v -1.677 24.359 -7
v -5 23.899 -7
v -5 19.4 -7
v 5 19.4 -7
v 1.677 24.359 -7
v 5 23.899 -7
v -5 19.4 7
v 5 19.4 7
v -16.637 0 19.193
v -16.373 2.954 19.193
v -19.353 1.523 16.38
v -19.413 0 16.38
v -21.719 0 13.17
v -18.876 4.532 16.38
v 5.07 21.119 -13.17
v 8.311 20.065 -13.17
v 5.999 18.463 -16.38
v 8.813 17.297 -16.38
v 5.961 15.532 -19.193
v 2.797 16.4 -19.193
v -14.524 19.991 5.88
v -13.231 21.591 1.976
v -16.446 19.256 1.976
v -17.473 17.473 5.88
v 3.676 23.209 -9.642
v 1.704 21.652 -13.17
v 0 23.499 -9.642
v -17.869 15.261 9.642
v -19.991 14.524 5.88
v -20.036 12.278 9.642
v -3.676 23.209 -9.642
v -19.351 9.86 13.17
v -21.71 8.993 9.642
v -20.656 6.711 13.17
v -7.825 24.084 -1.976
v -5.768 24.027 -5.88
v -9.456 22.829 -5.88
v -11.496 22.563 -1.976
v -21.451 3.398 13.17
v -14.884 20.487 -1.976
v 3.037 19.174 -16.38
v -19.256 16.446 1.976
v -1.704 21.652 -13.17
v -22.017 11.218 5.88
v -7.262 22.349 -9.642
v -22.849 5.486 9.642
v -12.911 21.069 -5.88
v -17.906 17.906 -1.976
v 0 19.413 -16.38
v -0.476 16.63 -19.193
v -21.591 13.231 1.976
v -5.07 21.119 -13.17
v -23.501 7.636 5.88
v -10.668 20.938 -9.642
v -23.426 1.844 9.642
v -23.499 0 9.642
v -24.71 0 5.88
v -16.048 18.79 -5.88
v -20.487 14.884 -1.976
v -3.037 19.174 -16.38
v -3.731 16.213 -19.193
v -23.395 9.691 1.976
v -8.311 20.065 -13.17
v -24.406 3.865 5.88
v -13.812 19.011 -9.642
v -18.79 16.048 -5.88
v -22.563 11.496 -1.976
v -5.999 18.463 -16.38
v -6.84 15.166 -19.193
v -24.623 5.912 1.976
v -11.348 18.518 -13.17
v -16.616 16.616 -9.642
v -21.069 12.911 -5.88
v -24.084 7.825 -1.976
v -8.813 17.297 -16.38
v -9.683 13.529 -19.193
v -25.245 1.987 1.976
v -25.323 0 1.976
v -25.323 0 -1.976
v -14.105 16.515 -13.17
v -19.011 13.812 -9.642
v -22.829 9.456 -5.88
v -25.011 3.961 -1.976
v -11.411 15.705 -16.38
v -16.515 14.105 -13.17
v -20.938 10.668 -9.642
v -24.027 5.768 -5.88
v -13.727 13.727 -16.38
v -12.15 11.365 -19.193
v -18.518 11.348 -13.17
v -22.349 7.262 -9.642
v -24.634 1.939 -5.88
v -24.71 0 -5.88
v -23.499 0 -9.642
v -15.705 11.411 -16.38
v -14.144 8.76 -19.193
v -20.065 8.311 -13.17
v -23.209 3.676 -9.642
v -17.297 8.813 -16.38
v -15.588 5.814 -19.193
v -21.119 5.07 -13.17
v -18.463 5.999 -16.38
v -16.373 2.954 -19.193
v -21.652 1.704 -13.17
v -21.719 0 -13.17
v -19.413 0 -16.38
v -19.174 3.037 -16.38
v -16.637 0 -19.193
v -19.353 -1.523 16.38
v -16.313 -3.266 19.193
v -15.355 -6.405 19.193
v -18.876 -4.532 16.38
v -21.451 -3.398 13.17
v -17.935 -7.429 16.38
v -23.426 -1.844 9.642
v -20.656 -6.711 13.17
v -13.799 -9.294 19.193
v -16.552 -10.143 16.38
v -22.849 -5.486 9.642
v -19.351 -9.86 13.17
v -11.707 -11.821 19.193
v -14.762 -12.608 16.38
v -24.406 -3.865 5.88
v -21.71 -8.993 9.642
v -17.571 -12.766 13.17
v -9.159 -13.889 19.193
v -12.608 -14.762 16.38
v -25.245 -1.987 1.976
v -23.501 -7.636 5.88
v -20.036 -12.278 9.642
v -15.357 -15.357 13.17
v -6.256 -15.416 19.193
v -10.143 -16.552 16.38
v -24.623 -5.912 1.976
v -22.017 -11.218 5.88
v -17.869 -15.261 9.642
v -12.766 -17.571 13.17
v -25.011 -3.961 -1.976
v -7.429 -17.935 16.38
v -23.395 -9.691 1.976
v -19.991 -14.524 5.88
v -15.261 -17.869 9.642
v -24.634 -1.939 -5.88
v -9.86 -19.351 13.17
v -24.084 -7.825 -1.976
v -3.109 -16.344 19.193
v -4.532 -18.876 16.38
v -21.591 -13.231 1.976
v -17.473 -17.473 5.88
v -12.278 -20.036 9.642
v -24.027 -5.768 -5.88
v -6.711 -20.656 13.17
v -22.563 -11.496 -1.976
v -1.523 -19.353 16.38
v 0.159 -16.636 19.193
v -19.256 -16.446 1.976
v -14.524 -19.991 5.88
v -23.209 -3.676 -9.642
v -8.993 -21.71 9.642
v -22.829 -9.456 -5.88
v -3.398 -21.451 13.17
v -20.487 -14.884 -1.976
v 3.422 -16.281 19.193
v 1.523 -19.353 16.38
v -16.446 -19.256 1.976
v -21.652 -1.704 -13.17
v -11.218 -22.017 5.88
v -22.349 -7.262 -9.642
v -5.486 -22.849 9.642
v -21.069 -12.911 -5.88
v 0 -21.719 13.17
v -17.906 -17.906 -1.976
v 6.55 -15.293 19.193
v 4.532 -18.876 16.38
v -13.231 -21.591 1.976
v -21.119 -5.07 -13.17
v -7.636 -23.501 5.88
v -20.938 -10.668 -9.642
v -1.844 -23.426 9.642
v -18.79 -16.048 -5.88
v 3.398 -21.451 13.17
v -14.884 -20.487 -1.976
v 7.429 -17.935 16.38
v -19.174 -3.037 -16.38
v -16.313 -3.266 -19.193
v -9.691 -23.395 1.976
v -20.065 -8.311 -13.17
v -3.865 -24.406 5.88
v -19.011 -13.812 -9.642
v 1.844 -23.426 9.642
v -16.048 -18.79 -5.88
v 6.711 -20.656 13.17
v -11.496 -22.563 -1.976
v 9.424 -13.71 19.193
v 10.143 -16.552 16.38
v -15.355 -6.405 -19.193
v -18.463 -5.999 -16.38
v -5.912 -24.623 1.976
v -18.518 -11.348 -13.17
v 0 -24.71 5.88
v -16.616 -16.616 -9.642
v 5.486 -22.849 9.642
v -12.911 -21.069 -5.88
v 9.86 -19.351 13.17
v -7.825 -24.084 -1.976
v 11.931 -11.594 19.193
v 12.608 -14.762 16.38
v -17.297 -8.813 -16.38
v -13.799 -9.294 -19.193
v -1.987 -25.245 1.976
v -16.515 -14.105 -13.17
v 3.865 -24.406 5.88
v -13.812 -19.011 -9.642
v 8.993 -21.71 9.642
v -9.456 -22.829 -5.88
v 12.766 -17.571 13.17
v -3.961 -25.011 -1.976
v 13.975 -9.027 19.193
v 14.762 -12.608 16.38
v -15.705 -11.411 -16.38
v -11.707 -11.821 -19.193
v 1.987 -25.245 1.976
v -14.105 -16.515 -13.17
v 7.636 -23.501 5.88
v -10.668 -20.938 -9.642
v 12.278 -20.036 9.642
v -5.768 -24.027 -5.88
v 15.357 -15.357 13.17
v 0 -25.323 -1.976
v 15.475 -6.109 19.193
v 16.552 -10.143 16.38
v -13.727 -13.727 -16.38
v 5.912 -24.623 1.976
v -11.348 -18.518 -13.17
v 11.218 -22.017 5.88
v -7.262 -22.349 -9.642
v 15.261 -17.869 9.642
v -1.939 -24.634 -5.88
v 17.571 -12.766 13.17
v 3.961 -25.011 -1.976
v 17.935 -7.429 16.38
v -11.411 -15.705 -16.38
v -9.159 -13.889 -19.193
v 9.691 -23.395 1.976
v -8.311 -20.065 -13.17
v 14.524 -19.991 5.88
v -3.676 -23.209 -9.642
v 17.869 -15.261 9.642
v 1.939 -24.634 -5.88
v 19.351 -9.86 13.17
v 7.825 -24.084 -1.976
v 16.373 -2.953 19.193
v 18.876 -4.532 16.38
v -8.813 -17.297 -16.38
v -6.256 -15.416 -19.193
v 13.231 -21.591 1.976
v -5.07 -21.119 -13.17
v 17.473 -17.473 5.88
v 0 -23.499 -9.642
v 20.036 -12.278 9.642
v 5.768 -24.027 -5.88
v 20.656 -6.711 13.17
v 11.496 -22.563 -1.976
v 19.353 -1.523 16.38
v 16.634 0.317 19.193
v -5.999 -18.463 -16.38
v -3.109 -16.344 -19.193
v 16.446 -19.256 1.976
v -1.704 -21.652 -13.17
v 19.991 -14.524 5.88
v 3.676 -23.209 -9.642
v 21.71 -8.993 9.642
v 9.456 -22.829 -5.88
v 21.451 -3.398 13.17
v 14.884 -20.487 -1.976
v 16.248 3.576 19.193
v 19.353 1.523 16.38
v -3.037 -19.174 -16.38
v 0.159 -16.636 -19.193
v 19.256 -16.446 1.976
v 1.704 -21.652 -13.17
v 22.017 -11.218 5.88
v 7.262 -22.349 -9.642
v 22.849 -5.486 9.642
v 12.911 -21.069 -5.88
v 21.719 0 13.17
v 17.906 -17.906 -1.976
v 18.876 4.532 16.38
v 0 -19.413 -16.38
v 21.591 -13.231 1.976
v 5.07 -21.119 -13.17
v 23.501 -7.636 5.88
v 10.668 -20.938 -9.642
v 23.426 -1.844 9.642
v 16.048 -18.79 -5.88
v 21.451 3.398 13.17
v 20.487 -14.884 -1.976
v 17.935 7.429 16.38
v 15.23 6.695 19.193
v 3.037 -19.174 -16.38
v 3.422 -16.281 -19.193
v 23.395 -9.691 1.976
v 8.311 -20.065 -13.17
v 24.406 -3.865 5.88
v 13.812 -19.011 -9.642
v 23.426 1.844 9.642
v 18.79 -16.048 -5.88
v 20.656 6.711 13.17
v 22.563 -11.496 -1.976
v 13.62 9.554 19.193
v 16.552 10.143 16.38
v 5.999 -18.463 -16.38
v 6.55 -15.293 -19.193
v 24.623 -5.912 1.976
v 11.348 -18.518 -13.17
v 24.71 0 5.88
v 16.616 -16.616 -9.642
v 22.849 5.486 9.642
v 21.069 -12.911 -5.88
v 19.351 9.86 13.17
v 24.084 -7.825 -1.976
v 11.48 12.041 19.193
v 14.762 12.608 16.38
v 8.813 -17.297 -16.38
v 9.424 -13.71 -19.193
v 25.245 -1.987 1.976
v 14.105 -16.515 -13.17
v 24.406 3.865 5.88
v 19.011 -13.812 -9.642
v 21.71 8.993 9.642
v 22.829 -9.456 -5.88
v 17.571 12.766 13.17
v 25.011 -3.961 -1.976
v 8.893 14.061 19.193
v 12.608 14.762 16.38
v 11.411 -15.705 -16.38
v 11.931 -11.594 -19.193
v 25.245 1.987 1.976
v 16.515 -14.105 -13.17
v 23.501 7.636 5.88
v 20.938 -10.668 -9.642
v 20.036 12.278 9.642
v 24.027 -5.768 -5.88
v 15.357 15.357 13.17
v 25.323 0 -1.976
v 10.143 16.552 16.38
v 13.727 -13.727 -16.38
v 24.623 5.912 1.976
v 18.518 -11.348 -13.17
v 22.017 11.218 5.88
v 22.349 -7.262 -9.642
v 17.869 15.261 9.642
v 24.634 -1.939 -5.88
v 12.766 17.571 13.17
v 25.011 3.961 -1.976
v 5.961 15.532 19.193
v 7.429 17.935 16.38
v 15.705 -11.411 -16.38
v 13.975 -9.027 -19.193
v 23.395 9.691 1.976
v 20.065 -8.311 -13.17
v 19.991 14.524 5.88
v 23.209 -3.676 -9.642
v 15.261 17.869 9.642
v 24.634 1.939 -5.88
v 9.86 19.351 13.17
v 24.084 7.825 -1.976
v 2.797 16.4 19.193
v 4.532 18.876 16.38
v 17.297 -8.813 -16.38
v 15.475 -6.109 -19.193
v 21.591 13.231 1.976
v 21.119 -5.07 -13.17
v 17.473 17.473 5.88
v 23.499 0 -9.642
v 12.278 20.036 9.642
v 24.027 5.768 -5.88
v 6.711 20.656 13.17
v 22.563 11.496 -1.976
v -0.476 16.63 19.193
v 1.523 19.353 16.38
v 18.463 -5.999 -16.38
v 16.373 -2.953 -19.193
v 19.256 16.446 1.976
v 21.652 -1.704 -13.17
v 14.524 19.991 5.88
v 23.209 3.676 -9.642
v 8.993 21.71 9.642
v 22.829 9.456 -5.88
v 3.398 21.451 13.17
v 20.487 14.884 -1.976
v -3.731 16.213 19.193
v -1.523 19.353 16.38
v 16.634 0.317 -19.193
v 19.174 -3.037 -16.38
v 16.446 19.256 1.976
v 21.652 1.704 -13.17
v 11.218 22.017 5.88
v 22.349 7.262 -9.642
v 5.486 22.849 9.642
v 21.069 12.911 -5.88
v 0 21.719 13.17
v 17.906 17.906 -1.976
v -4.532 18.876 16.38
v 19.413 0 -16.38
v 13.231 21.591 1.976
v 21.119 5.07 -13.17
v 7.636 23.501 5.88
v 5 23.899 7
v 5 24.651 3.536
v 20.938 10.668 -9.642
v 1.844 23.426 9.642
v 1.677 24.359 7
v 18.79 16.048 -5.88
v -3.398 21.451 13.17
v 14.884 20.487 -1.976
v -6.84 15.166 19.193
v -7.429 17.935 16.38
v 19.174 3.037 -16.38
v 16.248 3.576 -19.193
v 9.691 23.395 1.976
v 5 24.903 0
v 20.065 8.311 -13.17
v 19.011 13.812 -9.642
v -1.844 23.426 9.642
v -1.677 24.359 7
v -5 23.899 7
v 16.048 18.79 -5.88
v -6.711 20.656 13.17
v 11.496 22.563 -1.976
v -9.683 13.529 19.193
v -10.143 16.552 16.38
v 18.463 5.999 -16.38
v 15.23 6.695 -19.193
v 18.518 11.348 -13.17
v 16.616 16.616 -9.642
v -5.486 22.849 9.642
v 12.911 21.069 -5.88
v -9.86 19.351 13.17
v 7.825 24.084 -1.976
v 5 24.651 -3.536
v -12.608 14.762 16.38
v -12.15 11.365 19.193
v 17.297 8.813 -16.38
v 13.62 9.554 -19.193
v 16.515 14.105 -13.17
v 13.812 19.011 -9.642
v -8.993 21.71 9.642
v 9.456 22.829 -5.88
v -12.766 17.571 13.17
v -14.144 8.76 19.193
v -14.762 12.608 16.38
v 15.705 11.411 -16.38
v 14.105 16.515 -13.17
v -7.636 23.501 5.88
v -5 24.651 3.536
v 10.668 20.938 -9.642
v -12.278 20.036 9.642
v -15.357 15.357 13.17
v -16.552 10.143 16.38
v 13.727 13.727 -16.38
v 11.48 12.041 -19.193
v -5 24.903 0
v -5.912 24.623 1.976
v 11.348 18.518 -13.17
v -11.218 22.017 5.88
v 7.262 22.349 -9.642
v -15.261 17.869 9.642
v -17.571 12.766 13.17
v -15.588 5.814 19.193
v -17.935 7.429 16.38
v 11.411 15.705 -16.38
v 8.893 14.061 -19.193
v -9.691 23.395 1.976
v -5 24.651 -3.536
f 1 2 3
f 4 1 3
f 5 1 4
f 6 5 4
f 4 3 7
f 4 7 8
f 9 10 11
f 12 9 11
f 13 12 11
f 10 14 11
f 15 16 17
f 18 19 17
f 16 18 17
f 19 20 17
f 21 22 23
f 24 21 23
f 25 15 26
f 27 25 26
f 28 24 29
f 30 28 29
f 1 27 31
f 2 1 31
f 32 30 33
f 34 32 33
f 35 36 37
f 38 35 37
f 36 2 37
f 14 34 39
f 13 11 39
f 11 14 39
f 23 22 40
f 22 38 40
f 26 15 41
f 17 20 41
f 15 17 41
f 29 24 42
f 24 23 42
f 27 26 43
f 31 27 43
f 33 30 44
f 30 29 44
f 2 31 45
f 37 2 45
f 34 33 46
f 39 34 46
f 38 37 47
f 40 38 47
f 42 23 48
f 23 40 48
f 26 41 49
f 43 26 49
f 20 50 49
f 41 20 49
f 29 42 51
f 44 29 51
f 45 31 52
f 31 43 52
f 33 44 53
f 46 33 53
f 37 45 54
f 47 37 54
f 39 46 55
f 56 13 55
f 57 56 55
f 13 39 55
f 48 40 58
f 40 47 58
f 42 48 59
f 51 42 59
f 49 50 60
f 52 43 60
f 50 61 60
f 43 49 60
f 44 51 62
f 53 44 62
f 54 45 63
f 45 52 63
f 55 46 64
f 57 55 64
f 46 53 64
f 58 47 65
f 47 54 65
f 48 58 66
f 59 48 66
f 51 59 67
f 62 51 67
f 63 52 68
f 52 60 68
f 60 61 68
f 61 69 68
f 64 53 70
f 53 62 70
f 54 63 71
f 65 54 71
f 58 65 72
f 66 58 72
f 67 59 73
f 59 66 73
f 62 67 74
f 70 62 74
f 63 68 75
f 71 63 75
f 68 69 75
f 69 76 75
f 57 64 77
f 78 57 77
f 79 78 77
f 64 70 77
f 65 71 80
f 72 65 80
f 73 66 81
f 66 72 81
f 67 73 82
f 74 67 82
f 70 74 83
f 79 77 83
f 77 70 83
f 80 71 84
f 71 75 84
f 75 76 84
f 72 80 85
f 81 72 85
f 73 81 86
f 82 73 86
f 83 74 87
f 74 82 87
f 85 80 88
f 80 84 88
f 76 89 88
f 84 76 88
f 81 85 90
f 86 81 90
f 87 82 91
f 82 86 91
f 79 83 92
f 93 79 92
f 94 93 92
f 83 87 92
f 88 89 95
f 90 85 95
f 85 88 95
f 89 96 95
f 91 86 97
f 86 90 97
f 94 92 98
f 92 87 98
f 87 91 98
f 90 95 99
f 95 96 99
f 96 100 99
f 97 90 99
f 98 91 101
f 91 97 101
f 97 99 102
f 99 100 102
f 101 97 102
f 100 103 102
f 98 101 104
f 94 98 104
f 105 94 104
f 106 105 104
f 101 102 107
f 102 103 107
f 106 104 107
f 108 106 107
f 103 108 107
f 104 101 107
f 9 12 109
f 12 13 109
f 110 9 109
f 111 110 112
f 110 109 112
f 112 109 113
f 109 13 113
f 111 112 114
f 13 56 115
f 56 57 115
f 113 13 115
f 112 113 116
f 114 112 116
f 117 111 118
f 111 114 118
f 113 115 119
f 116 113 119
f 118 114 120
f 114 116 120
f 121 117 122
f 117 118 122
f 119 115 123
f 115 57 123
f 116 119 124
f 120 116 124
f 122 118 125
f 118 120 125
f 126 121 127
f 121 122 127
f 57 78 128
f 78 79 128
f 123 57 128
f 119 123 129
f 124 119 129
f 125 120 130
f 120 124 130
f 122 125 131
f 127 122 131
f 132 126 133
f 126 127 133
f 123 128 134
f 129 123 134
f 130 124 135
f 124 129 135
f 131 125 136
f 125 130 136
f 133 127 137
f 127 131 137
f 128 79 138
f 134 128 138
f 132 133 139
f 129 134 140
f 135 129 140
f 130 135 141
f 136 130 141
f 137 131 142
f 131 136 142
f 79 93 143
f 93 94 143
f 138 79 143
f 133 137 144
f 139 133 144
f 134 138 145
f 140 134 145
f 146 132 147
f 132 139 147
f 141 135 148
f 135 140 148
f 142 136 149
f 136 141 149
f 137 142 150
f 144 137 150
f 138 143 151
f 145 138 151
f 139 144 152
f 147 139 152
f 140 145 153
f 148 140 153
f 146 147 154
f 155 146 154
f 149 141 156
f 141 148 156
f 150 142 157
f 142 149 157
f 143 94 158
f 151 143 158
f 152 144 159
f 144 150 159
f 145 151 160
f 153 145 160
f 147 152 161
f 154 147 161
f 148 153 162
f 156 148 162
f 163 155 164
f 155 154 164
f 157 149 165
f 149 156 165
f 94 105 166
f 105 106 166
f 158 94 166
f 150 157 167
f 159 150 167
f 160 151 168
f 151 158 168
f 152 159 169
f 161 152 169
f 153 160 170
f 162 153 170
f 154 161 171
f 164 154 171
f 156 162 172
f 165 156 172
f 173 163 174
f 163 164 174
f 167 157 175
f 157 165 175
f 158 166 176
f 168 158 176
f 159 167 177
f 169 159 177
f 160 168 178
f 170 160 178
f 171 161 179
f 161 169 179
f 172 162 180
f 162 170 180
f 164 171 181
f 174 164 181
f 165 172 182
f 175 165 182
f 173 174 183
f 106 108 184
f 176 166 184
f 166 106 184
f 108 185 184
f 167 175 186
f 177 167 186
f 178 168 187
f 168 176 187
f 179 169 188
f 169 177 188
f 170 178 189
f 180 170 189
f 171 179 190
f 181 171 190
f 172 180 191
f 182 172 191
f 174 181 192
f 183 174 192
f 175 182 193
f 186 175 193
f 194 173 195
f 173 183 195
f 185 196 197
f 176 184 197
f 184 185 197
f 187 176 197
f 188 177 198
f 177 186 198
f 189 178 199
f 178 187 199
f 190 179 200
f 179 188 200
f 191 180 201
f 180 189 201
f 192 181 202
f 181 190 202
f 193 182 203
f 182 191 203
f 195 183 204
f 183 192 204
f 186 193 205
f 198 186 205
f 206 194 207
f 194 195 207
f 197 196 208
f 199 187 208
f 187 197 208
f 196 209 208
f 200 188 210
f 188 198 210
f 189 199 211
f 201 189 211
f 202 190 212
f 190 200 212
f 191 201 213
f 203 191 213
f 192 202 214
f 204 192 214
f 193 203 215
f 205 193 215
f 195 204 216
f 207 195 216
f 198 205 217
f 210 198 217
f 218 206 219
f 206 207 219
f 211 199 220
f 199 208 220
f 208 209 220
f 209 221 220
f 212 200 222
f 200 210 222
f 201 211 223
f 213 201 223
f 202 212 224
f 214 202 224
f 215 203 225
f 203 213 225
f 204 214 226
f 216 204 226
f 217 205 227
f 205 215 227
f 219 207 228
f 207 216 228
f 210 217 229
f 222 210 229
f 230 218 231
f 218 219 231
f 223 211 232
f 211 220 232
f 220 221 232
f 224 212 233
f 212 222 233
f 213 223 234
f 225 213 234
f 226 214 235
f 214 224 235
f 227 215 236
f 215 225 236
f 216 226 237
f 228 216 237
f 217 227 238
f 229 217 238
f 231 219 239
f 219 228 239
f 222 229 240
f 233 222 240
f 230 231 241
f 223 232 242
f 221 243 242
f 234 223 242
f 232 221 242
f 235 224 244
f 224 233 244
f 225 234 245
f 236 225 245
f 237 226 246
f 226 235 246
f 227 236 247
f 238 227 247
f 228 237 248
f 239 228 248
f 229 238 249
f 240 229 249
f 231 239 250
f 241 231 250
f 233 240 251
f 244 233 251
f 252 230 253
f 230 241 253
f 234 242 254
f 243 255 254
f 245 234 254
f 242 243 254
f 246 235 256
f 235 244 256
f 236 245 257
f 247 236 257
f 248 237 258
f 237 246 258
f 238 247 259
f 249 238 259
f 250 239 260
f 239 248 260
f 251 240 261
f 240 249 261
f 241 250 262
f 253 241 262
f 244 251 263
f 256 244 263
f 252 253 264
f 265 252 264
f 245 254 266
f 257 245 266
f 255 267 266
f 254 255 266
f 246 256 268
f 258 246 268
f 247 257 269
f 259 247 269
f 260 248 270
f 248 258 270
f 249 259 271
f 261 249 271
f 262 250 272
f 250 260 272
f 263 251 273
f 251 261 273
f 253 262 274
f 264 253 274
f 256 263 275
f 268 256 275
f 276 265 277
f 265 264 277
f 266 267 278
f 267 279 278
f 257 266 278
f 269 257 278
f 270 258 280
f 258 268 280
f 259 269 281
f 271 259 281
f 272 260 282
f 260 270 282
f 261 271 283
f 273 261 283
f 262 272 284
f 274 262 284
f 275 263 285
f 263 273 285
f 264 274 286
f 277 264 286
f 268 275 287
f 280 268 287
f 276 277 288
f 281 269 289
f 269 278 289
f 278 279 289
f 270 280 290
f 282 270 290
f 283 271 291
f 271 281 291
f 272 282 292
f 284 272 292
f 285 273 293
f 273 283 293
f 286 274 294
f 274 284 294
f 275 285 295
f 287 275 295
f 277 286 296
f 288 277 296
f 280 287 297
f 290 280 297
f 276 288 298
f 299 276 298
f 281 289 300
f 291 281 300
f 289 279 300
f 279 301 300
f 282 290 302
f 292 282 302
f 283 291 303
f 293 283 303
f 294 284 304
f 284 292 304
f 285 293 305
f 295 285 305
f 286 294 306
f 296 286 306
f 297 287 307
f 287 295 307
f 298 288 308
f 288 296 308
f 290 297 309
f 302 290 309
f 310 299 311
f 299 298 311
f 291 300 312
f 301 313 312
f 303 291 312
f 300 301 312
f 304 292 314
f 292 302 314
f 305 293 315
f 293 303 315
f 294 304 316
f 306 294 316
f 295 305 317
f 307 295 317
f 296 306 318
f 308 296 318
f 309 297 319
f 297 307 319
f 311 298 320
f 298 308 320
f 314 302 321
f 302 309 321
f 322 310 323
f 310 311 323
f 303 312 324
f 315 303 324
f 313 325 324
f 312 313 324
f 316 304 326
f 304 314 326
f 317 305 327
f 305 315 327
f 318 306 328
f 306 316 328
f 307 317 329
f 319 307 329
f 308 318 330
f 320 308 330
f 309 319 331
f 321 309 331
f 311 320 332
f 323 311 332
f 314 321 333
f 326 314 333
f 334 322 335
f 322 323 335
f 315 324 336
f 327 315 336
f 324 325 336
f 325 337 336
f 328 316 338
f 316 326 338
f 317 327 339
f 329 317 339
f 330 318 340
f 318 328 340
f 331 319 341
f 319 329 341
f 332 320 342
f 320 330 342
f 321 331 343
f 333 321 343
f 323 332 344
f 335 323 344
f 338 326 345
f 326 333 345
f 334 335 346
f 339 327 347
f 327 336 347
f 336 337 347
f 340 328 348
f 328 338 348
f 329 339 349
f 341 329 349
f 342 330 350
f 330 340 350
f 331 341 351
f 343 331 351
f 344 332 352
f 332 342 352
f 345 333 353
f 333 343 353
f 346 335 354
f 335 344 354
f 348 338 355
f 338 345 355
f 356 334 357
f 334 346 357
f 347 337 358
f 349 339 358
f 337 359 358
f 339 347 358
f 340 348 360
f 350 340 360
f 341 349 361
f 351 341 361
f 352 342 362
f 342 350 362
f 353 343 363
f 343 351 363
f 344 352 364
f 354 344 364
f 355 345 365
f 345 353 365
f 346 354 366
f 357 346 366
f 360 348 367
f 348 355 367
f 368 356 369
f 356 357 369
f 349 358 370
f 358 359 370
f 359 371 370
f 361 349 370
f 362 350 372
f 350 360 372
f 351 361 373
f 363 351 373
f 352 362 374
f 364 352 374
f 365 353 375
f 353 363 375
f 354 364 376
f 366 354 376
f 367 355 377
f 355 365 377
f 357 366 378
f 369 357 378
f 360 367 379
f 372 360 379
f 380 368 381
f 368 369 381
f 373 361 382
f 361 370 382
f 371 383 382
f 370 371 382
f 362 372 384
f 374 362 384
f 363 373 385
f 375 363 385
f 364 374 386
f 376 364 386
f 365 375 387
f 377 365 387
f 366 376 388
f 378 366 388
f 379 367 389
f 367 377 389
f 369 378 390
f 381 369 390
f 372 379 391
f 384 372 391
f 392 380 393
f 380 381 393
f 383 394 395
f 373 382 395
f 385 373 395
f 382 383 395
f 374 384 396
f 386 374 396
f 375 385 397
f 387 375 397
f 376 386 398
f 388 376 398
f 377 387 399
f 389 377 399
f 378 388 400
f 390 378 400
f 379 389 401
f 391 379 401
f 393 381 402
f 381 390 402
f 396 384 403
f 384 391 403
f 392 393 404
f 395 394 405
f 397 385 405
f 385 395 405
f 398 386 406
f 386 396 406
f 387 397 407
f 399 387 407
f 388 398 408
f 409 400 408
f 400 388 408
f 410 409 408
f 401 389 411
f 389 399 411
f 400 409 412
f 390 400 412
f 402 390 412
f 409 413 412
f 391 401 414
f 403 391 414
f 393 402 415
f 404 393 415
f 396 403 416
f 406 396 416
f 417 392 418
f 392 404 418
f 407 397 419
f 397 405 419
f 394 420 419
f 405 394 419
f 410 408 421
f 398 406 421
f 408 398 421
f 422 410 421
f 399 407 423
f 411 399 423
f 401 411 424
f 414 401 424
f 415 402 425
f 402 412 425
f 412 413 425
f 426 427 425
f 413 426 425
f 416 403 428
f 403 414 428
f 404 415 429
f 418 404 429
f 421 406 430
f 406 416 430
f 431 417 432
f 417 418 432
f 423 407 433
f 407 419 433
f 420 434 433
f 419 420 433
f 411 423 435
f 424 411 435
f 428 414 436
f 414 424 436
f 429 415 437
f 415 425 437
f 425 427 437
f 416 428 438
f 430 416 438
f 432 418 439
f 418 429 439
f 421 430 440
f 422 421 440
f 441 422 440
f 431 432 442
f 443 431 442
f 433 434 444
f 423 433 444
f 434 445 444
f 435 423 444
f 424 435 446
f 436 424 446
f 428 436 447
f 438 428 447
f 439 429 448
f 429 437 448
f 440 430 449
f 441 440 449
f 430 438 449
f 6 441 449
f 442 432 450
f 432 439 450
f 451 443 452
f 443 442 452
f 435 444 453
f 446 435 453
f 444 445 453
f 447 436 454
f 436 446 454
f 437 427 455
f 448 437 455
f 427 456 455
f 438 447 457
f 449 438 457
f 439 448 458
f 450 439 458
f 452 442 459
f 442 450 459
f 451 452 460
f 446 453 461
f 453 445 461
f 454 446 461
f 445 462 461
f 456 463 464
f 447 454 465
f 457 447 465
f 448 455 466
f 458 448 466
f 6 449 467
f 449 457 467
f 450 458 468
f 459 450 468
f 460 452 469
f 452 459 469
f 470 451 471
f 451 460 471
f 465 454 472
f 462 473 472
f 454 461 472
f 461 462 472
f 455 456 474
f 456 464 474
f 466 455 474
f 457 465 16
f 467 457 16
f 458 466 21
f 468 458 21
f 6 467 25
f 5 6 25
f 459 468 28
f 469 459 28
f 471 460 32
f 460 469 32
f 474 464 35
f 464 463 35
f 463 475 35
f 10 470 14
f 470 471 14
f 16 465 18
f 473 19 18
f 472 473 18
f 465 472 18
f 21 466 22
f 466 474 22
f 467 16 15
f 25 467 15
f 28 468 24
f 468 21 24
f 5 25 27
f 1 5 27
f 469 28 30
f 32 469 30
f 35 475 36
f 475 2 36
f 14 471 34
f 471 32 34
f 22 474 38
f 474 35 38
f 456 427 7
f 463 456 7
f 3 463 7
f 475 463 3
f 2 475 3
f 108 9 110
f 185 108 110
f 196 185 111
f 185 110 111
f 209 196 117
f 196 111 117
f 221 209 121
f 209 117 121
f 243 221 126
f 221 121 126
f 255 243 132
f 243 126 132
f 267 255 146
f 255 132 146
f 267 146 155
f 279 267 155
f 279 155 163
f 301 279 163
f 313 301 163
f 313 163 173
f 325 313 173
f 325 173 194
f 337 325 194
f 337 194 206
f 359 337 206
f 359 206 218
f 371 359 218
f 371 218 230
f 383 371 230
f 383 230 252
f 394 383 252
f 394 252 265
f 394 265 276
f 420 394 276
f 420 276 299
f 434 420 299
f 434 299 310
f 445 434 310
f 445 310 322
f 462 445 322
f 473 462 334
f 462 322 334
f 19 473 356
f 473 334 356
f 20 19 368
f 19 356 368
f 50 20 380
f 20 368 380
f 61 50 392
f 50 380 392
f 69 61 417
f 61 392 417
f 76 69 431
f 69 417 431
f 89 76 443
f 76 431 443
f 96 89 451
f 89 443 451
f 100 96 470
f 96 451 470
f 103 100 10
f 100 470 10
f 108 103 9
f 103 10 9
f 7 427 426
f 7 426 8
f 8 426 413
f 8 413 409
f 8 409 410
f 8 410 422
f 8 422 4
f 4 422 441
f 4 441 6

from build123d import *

# Parameters (mm, degrees)
SKETCH5_R          = 16.637
CUT_EXTRUDE2_DEPTH = 58.401742134
SKETCH6_W          = 10
SKETCH6_H          = 14
CUT_EXTRUDE3_DEPTH = 6


with BuildPart() as part:
    # Sketch4 → Revolve4 (revolve)
    with BuildSketch(Plane(origin=(0, 0, 0), x_dir=(1, 0, 0), z_dir=(0, 1, 0))):
        with BuildLine():
            Line((-12, 22.386603137), (0, 22.386603137))
            Line((0, 22.386603137), (0, -22.386603137))
            Line((0, -22.386603137), (-12, -22.386603137))
            ThreePointArc((-12, -22.386603137), (-25.4, 0), (-12, 22.386603137))
        make_face()
    revolve(axis=Axis((0, 0, -17.487077089), (0, 0, 1)))

    # Sketch5 → Cut-Extrude2 (cut, through all)
    with BuildSketch(Plane.XY.offset(22.386603137)):
        with Locations(Location((0, 0, 0), (0, 0, 180))):
            Circle(SKETCH5_R)
    extrude(amount=-CUT_EXTRUDE2_DEPTH, mode=Mode.SUBTRACT)

    # Sketch6 → Cut-Extrude3 (cut)
    with BuildSketch(Plane(origin=(0, 25.4, 0), x_dir=(1, 0, 0), z_dir=(0, 1, 0))):
        Rectangle(SKETCH6_W, SKETCH6_H)
    extrude(amount=-CUT_EXTRUDE3_DEPTH, mode=Mode.SUBTRACT)


solid = part.part
